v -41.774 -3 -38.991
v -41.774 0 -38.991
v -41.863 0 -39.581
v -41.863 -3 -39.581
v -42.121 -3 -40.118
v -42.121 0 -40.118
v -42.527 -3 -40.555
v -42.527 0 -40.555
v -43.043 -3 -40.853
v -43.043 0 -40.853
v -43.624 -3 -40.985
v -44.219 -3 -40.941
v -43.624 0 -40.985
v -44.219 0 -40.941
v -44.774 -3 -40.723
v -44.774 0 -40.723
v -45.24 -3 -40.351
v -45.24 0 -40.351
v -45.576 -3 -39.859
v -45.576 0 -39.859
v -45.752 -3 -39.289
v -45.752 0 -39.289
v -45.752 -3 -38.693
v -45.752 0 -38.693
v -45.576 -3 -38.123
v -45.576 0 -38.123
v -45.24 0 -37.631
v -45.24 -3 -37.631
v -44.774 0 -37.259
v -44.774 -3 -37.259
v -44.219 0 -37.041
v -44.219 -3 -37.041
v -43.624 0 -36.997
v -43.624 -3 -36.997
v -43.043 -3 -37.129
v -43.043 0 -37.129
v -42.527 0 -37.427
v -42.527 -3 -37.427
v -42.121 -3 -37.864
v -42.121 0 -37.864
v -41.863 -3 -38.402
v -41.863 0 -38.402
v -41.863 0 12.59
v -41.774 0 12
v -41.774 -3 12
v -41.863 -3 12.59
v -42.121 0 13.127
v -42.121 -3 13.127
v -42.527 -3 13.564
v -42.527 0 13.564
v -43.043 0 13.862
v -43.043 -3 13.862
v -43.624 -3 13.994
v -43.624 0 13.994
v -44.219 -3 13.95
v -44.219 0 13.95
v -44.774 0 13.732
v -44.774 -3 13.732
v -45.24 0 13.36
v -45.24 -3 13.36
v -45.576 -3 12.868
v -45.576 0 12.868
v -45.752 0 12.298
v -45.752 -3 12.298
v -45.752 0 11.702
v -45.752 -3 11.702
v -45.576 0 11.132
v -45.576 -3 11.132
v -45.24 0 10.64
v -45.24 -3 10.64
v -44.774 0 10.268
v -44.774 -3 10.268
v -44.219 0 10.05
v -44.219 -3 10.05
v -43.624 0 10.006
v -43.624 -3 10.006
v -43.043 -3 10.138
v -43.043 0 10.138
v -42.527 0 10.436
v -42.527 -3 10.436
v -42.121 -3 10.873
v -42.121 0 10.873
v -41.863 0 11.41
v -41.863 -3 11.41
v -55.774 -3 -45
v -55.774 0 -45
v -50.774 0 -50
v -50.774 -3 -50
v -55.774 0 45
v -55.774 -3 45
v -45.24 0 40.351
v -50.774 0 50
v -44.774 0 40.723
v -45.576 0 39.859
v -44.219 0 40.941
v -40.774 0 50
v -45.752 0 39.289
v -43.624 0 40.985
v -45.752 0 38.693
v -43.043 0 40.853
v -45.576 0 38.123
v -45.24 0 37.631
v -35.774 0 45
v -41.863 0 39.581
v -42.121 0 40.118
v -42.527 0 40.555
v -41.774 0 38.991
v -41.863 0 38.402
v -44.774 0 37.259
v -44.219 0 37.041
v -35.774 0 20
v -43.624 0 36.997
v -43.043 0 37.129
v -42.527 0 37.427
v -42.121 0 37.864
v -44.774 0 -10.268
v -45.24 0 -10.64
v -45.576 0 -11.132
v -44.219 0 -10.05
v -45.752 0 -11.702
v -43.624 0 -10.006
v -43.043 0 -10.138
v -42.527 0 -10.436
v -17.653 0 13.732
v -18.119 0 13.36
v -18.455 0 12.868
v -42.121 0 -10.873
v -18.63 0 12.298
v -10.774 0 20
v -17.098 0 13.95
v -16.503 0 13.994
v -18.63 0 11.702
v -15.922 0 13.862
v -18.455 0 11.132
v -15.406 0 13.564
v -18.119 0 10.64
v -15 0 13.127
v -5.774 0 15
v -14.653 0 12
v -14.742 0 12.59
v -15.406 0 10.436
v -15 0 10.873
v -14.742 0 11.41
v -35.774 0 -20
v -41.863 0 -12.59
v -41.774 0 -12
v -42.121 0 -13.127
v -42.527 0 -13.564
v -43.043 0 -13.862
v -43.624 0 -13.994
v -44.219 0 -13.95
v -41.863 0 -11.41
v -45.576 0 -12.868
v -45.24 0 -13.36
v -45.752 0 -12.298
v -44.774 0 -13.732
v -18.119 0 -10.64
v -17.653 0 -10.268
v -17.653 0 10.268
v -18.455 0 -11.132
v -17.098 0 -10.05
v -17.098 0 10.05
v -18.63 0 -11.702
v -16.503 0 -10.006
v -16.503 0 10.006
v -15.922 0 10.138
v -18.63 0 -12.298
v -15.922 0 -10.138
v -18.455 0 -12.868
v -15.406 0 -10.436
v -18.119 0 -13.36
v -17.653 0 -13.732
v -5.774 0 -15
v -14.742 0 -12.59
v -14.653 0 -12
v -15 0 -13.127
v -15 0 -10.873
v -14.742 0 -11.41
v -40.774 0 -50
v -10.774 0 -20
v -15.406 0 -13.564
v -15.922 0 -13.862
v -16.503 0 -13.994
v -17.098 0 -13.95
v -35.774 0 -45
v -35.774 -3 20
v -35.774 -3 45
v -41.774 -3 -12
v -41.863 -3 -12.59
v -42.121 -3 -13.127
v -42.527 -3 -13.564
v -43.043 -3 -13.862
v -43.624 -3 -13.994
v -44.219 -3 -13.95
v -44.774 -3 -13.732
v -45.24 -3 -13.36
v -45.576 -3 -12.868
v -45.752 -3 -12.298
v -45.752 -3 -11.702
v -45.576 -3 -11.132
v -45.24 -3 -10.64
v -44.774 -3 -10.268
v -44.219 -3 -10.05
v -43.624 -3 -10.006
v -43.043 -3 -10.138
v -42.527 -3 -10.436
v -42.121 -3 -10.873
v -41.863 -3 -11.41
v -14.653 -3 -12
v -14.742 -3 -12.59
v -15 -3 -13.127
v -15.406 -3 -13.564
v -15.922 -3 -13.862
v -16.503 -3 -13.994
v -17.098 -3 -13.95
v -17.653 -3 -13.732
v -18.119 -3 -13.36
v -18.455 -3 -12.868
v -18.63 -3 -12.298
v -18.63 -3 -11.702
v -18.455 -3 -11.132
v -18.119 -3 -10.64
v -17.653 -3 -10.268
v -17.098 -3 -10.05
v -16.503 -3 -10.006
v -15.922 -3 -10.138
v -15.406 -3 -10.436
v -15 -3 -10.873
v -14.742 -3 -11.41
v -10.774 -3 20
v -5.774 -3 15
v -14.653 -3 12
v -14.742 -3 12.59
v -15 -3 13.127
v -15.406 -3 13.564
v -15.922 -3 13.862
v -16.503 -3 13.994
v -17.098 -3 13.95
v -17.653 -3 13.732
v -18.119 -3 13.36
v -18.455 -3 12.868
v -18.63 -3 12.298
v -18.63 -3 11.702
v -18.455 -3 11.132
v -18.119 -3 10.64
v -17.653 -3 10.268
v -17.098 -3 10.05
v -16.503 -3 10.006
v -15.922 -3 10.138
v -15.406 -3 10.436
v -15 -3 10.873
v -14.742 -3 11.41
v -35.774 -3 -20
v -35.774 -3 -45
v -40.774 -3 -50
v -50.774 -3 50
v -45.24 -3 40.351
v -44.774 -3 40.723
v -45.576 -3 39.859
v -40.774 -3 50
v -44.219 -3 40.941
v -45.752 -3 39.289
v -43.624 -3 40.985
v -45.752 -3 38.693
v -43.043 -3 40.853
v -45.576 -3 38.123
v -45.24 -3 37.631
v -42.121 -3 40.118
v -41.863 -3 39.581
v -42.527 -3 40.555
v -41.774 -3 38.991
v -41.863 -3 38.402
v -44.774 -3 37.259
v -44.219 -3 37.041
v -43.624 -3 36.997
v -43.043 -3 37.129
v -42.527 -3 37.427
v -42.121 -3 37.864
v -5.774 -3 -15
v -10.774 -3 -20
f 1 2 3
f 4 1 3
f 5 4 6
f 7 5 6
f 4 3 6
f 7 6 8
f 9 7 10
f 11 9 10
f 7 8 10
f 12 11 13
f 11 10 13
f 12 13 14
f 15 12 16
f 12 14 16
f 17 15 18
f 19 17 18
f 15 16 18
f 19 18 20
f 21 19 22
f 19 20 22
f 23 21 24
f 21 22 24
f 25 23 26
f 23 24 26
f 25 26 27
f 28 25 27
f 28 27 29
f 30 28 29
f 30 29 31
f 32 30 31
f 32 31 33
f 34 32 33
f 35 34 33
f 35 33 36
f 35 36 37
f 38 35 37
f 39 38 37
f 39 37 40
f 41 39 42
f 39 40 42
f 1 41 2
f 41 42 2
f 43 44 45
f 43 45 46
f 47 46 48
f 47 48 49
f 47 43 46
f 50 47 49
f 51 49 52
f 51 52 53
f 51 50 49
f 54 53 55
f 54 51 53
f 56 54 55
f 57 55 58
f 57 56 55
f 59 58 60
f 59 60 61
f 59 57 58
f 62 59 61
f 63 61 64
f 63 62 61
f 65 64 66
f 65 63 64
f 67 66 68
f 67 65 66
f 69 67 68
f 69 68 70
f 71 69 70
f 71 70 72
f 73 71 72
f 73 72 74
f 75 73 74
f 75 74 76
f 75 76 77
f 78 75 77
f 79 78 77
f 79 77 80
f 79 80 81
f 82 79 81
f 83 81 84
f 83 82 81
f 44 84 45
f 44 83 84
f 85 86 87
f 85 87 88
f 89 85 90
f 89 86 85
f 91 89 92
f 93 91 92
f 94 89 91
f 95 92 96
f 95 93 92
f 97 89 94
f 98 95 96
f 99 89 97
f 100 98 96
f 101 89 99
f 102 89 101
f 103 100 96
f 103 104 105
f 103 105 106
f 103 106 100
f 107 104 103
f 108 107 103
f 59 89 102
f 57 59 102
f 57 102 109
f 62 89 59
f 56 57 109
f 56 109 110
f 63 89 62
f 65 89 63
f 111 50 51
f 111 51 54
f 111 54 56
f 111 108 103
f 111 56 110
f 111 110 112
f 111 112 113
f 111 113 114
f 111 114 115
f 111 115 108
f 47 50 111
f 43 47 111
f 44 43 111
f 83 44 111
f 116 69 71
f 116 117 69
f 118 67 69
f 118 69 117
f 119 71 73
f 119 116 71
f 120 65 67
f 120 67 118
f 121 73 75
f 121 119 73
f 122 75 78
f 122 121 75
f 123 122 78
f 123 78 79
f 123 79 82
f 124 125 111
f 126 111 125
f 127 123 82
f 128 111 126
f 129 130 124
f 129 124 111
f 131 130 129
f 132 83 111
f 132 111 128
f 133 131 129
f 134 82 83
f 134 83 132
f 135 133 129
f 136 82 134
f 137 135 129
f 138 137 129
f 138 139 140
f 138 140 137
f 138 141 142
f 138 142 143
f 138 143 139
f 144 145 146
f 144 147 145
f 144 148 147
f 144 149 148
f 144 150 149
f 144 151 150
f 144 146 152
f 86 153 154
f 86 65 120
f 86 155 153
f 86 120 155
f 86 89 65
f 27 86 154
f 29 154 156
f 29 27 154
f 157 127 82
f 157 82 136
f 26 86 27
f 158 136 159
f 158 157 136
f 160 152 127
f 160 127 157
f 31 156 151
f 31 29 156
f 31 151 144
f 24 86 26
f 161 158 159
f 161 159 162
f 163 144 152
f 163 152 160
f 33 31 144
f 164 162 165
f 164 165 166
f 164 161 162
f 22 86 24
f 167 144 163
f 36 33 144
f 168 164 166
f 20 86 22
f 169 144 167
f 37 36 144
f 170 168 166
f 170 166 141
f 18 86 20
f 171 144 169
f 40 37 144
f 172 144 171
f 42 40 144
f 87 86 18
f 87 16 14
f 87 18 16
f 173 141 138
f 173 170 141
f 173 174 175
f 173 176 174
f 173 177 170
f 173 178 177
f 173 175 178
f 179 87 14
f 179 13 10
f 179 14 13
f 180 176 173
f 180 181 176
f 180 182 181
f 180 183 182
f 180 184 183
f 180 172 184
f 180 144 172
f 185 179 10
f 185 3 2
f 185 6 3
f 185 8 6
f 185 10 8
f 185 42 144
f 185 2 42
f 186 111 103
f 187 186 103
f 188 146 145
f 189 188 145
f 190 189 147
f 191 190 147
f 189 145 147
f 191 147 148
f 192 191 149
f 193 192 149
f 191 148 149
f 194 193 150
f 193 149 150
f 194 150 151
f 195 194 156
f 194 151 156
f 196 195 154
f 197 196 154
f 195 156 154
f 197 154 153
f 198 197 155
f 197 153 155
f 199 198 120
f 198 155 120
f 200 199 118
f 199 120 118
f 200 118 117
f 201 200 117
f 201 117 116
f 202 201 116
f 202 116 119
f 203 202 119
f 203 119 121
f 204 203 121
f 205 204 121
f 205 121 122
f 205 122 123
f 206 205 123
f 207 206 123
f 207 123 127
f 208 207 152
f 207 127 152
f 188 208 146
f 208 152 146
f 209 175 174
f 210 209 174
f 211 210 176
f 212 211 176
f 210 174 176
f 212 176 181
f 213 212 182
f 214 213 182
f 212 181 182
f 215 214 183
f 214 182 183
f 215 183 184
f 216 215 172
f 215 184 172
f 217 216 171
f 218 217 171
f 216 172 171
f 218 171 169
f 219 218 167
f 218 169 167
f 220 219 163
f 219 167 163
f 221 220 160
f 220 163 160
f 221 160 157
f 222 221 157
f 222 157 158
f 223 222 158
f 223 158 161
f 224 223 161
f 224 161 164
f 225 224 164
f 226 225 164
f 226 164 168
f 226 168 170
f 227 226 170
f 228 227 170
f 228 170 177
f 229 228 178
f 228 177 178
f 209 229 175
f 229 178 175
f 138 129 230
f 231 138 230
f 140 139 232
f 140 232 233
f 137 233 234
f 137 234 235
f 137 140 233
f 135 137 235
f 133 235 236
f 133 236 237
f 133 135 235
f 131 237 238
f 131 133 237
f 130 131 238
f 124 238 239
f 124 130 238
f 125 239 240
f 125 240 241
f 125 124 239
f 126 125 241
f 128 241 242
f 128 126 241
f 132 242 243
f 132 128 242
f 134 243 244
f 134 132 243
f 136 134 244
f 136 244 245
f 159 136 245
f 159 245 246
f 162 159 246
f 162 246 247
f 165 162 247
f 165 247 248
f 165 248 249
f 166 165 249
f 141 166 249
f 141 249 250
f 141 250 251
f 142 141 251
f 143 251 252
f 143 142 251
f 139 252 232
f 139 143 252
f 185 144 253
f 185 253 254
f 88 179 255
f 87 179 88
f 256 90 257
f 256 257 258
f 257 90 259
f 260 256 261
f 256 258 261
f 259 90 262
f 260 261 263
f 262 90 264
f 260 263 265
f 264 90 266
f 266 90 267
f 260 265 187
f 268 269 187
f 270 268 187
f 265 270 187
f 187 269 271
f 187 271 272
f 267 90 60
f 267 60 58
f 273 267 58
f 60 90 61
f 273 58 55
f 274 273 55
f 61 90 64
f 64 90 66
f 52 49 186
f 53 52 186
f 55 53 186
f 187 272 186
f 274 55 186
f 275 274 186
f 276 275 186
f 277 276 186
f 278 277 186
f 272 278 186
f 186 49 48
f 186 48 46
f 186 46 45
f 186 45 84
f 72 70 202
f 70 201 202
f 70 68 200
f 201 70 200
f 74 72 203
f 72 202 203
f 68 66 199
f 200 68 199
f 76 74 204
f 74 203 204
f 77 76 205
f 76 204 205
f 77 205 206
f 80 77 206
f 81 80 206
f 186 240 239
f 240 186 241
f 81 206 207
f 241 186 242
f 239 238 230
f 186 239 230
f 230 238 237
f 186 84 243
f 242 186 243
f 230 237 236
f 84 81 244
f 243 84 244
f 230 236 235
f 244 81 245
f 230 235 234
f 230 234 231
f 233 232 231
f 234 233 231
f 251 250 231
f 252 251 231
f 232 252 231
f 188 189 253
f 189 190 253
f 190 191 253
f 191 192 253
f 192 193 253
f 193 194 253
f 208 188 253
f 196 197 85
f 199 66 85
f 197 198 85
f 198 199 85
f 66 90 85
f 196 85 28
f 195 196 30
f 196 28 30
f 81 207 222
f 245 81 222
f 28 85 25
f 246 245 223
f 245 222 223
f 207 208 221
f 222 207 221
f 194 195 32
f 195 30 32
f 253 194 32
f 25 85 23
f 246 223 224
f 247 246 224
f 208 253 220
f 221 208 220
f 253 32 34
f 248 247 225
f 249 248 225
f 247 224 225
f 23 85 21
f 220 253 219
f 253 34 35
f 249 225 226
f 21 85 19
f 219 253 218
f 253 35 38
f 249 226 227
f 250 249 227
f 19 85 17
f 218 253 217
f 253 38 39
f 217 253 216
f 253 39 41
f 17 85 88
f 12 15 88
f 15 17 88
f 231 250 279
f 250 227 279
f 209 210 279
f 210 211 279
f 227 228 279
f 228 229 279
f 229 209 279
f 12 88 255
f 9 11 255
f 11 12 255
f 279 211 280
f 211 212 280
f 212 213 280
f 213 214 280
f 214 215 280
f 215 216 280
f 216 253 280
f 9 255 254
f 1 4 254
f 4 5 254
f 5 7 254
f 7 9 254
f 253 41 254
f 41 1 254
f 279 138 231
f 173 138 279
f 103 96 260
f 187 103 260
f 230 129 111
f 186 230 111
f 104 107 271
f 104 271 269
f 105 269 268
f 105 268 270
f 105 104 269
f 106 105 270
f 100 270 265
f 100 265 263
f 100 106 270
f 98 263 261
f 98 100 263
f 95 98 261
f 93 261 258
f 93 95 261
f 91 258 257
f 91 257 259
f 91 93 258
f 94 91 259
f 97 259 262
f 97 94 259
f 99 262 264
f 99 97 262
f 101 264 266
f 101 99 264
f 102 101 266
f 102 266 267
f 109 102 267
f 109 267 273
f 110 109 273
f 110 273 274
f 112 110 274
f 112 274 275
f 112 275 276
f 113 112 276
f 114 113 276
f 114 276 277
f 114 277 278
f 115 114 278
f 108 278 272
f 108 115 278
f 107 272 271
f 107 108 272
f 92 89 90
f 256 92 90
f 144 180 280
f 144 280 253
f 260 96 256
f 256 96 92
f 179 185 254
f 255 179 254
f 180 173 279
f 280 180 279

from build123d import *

# Parameters (mm, degrees)
F0_R     = 2
F1_DEPTH = 3
F3_SIZE  = 5


with BuildPart() as f1:
    # F0 (on Front) → F1 (new body)
    with BuildSketch(Plane.XZ):
        Polygon((-35.7739527003, 50), (-55.7739527003, 50), (-55.7739527003, 0), (-5.7739527003, 0), (-5.7739527003, 20), (-35.7739527003, 20), align=None)
        with Locations((-43.7739527003, 12)):
            Circle(F0_R, mode=Mode.SUBTRACT)
        with Locations((-16.6526697576, 12)):
            Circle(F0_R, mode=Mode.SUBTRACT)
        with Locations((-43.7739527003, 38.9910824597)):
            Circle(F0_R, mode=Mode.SUBTRACT)
    extrude(amount=F1_DEPTH)

    # F2: F1 across face


with BuildPart() as f1_1:
    add(f1.part)
    add(f1.part.mirror(Plane(origin=(-30.7739527003, -1.5, 0), x_dir=(1, 0, 0), z_dir=(0, 0, -1))))

    # F3
    f3_edges = [f1_1.edges().sort_by_distance(p)[0] for p in [
        (-5.773953, -1.5, 20),
        (-5.773953, -1.5, -20),
        (-35.773953, -1.5, 50),
        (-35.773953, -1.5, -50),
        (-55.773953, -1.5, 50),
        (-55.773953, -1.5, -50),
    ]]
    chamfer(f3_edges, length=F3_SIZE)


solid = f1_1.part
